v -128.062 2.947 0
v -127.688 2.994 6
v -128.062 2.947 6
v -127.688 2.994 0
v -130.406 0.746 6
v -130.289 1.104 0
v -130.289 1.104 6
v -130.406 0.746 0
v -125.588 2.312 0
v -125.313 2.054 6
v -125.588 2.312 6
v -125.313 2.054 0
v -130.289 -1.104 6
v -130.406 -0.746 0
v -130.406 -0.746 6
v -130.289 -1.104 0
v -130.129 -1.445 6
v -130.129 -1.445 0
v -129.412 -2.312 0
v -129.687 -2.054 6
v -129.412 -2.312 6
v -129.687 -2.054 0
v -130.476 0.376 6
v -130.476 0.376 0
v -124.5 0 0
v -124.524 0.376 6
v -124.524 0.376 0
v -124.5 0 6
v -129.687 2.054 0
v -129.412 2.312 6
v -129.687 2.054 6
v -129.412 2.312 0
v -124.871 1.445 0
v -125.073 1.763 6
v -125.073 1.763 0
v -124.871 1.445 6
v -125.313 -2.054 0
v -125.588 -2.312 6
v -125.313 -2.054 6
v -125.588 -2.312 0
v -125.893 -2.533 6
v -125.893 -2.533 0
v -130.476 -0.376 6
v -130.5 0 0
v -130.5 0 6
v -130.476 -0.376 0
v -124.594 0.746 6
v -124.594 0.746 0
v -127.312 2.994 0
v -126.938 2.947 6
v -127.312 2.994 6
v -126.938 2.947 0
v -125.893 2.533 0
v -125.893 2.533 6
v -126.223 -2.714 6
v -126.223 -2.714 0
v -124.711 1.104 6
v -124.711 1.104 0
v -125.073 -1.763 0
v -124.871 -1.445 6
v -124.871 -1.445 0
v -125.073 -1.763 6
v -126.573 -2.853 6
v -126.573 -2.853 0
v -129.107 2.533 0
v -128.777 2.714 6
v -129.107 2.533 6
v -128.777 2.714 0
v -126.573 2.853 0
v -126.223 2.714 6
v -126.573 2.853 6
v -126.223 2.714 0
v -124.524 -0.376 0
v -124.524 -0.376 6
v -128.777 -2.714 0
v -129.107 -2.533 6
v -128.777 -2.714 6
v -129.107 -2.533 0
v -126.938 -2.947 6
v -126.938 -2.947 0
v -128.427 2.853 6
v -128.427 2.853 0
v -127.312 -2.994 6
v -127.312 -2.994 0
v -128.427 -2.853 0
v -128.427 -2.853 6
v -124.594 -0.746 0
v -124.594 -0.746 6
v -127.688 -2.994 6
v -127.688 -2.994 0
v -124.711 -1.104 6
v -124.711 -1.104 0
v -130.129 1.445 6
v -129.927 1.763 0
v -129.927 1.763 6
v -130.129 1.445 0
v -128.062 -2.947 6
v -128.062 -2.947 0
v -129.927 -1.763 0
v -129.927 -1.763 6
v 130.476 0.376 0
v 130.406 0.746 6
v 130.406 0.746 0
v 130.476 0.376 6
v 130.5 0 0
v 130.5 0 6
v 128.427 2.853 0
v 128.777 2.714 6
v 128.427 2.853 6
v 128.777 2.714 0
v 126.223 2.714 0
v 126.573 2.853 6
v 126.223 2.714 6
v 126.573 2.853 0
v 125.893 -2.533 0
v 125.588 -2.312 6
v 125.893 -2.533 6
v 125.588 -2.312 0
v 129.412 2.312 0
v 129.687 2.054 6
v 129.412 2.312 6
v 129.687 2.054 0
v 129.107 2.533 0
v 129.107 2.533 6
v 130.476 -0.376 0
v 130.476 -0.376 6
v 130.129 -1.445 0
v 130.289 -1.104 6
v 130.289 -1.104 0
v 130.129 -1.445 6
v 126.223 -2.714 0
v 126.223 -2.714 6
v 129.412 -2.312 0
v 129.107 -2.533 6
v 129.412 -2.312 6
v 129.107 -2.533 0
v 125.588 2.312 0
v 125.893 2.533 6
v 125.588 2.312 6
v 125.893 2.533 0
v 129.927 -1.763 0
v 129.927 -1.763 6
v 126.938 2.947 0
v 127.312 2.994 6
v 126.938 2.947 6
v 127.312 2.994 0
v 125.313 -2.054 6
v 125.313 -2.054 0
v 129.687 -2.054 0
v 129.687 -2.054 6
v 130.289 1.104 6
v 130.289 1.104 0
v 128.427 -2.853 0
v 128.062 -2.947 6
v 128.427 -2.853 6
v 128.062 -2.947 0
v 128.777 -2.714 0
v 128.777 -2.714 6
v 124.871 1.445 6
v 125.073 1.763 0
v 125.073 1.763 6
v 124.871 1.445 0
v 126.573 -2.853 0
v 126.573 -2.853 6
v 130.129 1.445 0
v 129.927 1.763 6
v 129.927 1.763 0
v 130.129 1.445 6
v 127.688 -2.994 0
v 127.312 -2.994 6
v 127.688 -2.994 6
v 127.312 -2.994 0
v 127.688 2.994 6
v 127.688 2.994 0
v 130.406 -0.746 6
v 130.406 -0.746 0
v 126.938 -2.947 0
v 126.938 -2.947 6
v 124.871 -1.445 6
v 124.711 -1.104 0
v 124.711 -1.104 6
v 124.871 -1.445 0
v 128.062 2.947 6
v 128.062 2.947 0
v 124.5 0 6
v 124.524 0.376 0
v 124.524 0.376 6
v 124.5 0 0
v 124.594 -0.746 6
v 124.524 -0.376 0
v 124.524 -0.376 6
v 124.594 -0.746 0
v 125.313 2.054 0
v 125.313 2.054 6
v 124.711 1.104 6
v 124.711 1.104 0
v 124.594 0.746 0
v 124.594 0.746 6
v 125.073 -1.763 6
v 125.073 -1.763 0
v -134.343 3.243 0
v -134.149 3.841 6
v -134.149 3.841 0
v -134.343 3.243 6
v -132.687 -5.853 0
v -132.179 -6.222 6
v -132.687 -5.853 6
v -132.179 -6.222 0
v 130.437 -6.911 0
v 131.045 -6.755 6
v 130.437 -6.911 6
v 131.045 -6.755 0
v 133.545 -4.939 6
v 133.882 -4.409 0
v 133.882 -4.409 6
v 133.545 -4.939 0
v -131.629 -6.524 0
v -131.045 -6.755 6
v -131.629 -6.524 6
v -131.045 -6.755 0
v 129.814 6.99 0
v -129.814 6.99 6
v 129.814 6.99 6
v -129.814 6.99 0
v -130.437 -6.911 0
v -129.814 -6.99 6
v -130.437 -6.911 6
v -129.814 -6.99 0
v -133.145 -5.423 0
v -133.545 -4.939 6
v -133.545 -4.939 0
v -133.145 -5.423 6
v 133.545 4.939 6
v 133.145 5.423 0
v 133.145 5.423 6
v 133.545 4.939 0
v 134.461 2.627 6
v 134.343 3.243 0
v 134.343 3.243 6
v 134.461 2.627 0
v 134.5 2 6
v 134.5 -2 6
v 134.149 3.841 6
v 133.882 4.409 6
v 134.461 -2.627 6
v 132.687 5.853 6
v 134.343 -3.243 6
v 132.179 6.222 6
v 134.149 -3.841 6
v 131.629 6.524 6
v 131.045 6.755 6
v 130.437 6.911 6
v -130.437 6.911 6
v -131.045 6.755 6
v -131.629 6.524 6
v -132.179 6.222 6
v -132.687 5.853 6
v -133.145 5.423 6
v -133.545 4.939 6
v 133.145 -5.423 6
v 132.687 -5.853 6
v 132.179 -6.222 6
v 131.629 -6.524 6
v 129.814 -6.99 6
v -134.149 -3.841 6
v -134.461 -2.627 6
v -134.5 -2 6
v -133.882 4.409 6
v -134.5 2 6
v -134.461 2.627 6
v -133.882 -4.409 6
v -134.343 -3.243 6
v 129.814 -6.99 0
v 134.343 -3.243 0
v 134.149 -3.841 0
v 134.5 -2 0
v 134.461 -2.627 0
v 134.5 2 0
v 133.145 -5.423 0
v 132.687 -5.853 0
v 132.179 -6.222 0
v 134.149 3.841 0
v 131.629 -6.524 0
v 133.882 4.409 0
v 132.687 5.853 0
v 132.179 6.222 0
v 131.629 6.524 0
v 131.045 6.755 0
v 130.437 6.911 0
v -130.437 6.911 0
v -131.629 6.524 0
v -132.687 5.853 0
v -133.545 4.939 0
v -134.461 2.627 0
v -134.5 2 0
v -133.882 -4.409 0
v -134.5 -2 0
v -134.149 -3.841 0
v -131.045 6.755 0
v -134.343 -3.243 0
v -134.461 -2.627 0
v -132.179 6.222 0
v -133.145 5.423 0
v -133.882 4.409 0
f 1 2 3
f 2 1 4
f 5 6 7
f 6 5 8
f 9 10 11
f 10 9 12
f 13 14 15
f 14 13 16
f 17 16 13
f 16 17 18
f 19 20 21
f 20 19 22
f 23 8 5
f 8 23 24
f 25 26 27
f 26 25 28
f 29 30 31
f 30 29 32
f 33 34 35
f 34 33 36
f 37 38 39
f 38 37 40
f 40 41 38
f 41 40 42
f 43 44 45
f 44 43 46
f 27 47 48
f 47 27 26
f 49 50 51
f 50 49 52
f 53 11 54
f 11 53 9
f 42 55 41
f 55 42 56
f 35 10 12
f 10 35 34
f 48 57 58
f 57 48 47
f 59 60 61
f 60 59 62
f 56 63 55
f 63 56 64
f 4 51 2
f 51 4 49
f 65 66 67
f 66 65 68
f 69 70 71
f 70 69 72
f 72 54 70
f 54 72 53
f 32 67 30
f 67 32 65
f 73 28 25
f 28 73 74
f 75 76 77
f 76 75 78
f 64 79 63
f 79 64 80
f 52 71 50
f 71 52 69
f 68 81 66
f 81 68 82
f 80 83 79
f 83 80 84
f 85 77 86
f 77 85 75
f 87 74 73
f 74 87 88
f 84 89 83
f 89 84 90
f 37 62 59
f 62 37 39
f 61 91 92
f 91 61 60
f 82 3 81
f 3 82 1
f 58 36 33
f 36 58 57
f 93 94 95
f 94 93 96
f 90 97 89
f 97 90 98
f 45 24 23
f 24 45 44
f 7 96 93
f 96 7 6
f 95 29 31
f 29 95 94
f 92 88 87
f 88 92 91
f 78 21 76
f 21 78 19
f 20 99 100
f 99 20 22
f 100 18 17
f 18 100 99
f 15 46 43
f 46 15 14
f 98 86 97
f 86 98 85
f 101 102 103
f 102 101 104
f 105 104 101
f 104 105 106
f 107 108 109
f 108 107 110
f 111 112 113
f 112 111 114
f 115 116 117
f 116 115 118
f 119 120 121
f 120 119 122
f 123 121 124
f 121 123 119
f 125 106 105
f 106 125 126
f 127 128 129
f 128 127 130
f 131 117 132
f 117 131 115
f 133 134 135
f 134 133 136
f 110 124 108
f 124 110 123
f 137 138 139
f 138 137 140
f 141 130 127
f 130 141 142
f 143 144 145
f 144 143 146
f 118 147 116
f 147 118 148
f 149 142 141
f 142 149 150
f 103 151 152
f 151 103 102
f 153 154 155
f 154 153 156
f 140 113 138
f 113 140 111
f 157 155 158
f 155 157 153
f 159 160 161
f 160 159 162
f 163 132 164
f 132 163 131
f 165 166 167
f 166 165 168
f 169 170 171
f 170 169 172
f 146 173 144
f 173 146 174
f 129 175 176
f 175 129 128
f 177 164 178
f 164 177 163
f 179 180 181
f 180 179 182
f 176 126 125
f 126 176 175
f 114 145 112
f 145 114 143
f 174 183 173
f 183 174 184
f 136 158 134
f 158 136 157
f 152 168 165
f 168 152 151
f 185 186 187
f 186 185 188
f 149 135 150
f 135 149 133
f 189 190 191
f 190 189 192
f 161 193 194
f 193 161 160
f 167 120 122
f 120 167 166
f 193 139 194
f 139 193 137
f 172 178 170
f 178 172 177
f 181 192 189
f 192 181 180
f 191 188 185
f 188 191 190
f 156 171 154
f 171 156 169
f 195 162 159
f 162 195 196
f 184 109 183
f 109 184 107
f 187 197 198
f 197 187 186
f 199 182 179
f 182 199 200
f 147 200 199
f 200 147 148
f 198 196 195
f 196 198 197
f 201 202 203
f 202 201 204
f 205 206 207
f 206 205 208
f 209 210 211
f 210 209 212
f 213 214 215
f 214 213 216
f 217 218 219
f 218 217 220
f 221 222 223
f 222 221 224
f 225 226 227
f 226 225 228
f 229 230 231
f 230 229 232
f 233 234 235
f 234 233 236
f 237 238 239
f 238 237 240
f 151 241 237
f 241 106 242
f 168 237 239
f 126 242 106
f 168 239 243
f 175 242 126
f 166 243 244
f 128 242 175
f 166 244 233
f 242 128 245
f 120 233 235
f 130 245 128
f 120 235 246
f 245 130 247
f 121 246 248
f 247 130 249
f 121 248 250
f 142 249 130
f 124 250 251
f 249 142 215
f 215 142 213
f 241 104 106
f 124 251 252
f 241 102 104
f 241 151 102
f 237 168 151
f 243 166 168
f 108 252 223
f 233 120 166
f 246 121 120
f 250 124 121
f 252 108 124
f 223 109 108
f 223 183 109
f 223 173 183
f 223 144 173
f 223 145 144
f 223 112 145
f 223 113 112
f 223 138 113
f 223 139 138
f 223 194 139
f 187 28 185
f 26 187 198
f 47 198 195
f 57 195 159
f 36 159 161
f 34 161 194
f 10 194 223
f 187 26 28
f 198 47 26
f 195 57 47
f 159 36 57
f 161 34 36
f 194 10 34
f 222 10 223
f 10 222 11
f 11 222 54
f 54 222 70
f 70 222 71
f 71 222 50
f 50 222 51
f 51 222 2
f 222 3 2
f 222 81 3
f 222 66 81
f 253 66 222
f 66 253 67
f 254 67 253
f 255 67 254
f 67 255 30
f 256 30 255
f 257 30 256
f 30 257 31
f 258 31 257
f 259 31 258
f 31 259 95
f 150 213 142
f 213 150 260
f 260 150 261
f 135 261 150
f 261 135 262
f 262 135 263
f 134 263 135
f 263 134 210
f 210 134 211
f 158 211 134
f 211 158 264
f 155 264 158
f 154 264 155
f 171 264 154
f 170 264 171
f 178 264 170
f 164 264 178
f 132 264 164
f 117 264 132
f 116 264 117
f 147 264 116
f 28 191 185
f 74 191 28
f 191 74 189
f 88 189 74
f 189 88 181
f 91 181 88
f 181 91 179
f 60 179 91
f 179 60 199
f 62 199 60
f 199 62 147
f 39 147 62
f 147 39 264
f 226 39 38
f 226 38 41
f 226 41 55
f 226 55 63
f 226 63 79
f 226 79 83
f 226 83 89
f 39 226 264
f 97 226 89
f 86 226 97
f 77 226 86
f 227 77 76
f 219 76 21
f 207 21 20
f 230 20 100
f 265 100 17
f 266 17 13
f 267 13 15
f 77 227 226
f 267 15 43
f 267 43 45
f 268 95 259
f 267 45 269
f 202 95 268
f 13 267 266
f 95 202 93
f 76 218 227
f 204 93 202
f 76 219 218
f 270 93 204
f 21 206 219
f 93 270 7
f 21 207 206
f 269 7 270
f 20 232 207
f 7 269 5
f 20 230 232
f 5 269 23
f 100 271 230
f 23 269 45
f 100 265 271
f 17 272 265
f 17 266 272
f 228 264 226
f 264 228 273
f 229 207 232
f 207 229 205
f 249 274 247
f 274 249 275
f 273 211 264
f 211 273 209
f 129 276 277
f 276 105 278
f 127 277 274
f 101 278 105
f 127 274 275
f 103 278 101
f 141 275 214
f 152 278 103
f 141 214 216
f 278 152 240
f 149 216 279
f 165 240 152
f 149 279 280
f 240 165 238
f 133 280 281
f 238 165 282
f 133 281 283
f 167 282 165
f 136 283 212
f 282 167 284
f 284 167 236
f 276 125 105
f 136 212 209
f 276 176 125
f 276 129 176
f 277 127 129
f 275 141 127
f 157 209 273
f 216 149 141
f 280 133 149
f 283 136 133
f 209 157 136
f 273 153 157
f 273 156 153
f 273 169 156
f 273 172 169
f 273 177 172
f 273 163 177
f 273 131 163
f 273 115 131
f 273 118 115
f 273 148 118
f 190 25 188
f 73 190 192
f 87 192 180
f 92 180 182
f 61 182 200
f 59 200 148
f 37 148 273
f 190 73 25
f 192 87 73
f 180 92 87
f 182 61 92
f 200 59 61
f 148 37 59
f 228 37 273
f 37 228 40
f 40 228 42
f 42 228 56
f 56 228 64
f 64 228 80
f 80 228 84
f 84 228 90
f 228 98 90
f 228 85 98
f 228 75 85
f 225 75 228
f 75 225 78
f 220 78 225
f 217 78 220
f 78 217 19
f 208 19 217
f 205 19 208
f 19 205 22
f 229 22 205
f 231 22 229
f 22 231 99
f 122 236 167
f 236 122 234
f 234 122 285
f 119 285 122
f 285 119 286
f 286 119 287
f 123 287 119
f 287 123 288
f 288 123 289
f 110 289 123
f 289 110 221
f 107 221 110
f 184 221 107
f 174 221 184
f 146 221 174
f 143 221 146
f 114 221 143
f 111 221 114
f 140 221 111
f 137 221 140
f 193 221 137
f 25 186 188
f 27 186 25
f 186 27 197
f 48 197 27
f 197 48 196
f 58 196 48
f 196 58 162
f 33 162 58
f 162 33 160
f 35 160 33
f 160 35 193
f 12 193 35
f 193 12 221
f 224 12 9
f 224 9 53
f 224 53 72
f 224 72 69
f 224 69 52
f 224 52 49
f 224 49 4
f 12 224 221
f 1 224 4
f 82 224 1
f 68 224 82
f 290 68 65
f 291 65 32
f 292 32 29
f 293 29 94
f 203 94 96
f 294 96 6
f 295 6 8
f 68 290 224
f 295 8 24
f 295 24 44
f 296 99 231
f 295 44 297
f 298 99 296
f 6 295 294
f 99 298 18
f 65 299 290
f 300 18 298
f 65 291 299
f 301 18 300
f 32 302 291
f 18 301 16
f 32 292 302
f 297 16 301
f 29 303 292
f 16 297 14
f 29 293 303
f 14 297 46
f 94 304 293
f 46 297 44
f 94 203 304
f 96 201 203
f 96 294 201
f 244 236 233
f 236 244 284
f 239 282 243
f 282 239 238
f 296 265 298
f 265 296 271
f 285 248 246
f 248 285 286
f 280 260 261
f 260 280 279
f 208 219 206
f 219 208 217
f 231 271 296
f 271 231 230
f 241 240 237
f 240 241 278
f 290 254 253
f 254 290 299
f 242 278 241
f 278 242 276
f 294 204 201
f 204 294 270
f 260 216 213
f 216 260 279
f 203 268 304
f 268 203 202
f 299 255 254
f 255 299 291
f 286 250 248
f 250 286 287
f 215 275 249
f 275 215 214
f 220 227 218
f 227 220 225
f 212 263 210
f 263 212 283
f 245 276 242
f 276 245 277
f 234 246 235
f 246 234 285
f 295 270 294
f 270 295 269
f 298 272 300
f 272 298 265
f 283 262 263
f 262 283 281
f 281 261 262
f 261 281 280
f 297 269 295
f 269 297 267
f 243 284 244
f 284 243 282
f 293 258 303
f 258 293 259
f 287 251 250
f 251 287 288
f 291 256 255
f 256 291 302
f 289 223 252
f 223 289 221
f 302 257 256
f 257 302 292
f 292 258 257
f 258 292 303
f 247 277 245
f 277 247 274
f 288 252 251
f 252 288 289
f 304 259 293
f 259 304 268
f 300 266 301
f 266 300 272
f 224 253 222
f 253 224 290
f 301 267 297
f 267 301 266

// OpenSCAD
$fn = 50;


difference() {
	union() {
		hull() {
			translate(v = [-129.5000000000, 2.0000000000, 0]) {
				cylinder(h = 6, r = 5);
			}
			translate(v = [129.5000000000, 2.0000000000, 0]) {
				cylinder(h = 6, r = 5);
			}
			translate(v = [-129.5000000000, -2.0000000000, 0]) {
				cylinder(h = 6, r = 5);
			}
			translate(v = [129.5000000000, -2.0000000000, 0]) {
				cylinder(h = 6, r = 5);
			}
		}
	}
	union() {
		translate(v = [-127.5000000000, 0.0000000000, -100.0000000000]) {
			cylinder(h = 200, r = 3.0000000000);
		}
		translate(v = [-127.5000000000, 0.0000000000, -100.0000000000]) {
			cylinder(h = 200, r = 3.0000000000);
		}
		translate(v = [127.5000000000, 0.0000000000, -100.0000000000]) {
			cylinder(h = 200, r = 3.0000000000);
		}
		translate(v = [127.5000000000, 0.0000000000, -100.0000000000]) {
			cylinder(h = 200, r = 3.0000000000);
		}
	}
}
